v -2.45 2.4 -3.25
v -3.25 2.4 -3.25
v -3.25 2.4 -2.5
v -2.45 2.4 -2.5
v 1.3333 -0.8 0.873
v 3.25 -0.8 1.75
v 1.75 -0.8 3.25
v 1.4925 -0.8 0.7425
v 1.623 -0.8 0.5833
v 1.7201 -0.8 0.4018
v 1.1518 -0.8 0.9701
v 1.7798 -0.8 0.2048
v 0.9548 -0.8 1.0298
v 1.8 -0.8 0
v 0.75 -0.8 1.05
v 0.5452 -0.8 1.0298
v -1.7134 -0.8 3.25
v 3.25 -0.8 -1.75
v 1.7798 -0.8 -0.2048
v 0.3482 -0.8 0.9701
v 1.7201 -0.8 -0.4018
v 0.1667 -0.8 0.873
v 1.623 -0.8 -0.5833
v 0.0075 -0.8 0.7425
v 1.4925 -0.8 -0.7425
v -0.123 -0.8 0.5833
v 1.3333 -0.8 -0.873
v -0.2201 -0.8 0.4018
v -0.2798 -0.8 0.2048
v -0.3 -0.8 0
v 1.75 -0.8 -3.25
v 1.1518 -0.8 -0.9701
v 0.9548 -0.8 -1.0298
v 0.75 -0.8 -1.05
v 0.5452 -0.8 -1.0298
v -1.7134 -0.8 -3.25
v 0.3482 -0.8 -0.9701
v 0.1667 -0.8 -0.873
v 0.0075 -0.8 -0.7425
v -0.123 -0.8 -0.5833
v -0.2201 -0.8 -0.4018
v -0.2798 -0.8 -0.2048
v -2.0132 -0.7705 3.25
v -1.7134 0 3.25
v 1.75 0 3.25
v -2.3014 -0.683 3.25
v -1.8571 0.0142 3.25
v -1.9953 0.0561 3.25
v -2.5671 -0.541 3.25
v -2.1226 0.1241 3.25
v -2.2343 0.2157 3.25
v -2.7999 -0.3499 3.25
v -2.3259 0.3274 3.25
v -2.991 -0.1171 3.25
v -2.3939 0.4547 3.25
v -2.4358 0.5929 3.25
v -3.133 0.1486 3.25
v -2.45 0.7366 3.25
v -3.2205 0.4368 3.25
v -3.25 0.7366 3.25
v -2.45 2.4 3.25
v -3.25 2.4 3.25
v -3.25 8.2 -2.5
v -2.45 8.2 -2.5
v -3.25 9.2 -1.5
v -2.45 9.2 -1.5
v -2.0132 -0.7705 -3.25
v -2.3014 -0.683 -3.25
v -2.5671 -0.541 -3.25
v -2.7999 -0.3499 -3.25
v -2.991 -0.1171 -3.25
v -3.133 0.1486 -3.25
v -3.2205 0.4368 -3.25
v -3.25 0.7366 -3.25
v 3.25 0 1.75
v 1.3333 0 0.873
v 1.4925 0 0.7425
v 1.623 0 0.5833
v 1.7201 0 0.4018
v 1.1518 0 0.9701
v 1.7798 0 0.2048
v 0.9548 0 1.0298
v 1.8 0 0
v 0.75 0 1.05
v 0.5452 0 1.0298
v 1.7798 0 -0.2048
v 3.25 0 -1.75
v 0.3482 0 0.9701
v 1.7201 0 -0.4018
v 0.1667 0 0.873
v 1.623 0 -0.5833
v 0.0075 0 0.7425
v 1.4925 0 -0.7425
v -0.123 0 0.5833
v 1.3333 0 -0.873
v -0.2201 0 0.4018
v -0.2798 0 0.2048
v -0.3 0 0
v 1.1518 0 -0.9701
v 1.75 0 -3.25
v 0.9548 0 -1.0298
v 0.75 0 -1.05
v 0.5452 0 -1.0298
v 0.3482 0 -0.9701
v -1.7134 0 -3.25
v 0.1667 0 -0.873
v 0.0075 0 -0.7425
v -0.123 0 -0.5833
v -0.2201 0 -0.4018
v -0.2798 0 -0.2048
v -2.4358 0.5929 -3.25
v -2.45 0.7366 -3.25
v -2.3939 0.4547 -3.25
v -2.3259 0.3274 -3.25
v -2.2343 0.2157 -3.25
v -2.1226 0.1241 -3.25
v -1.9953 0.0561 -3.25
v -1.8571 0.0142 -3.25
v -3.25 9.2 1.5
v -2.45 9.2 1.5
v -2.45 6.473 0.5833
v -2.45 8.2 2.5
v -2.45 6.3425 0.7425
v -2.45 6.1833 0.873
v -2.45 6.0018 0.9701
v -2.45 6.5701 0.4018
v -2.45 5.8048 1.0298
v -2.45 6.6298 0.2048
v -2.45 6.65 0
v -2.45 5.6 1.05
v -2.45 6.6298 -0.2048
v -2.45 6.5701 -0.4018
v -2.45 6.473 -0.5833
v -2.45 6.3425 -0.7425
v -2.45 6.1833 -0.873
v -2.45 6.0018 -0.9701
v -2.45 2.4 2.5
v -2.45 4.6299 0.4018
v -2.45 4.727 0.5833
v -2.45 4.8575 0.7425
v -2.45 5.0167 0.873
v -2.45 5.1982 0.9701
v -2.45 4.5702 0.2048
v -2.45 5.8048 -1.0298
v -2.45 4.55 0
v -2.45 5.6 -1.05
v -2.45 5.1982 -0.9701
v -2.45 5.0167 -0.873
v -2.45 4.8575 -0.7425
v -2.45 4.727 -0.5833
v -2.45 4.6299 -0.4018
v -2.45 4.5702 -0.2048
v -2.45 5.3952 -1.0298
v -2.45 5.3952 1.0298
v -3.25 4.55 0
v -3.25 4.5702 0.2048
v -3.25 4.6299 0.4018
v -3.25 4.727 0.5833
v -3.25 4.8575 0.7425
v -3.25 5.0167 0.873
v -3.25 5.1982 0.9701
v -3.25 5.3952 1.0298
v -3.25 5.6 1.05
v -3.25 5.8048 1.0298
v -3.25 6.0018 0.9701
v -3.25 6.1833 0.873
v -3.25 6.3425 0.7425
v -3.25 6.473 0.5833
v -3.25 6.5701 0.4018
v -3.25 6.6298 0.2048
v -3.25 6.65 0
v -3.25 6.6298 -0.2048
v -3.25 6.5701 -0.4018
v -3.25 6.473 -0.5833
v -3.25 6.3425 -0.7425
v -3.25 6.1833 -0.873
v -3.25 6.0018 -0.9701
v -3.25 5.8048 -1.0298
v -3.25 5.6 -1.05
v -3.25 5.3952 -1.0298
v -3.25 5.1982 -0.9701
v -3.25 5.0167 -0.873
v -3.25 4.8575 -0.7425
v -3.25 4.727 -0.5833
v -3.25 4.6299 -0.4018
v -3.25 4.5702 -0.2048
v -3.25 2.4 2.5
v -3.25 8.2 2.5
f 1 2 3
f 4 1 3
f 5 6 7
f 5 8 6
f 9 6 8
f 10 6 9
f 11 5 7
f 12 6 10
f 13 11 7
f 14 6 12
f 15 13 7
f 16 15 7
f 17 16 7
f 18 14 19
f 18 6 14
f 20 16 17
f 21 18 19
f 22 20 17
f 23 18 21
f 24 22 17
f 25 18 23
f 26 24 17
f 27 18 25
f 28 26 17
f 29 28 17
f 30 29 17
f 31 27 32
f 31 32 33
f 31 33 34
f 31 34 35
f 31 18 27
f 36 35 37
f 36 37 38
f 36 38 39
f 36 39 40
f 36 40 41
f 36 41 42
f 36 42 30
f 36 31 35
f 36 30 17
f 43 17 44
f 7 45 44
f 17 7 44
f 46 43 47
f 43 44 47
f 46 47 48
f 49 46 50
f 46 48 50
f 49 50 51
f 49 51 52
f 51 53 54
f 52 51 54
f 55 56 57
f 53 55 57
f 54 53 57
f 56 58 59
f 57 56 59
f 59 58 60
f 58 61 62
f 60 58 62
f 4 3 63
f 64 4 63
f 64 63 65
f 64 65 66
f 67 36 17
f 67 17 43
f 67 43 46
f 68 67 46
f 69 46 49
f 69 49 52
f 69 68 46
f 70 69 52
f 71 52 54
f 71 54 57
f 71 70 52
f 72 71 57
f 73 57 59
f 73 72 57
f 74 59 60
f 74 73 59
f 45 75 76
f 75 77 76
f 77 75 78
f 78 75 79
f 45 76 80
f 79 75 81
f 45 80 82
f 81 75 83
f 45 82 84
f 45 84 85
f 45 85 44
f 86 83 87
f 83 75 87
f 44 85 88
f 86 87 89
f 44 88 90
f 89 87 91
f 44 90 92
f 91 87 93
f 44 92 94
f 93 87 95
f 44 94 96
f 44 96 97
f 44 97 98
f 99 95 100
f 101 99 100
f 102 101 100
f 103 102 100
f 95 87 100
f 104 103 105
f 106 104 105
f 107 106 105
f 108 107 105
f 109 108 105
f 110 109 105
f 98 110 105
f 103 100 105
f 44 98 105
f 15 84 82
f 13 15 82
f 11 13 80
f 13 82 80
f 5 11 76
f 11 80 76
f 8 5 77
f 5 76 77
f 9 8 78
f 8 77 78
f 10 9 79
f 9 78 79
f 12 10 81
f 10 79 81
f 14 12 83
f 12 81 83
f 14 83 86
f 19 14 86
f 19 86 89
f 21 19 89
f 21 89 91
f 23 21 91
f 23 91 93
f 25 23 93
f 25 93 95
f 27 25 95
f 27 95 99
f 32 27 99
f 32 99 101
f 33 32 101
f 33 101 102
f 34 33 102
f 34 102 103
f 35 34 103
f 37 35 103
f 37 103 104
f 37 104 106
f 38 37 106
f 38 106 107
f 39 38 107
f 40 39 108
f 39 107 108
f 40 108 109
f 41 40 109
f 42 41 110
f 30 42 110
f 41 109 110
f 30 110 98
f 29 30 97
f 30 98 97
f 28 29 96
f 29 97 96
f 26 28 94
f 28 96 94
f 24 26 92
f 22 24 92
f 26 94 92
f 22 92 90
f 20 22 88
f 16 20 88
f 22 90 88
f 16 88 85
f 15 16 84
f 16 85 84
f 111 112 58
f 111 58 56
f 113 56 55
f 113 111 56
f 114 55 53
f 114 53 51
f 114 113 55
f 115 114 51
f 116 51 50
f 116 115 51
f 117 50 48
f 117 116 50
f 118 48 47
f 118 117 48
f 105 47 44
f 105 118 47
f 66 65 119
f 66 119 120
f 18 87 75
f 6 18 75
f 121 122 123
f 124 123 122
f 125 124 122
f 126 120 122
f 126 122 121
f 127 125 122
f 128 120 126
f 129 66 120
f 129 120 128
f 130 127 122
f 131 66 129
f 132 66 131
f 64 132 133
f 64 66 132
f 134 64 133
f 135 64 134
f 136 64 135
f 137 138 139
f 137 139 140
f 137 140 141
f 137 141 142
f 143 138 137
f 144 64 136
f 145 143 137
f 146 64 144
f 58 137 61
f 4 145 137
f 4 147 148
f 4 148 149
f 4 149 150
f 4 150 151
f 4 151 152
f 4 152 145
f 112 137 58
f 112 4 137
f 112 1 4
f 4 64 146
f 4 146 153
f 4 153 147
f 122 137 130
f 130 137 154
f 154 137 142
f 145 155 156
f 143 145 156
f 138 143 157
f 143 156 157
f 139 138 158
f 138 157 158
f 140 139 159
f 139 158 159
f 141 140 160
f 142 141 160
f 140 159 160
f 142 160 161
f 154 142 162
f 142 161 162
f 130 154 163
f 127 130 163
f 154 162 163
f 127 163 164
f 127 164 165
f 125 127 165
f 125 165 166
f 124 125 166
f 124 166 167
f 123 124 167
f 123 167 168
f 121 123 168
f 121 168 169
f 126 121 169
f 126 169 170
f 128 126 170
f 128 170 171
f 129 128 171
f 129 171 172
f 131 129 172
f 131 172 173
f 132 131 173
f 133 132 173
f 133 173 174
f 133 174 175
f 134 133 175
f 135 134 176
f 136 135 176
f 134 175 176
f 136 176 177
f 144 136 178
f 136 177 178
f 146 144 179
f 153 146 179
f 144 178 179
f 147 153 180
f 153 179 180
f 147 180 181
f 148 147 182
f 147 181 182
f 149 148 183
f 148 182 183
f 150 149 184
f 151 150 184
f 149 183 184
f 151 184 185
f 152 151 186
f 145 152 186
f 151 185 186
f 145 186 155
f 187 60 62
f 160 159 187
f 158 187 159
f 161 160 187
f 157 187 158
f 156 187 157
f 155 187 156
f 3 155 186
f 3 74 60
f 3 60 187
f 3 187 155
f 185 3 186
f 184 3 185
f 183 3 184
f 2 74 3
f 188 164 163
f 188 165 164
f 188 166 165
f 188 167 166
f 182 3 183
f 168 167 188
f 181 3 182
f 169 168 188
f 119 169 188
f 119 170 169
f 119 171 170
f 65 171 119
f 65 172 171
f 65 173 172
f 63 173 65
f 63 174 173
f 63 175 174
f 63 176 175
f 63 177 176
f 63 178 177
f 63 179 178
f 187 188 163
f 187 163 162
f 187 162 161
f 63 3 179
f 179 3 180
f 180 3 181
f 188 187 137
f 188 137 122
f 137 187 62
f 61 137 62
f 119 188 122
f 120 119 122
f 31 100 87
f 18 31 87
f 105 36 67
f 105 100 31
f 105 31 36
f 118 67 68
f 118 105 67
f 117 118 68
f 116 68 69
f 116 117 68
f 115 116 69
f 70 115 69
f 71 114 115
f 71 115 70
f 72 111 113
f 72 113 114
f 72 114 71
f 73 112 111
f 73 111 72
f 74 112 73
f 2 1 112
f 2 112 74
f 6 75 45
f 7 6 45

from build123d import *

# Parameters (mm, degrees)
BASE_FLANGE1_DEPTH           = 0.8
EDGE_FLANGE1_STRIP_W         = 4.6732
EDGE_FLANGE1_STRIP_H         = 0.8
EDGE_FLANGE1_STRIP_CUT_DEPTH = 6.5
EDGE_FLANGE1_DEPTH           = 6.5
SKETCH10_W                   = 0.75
SKETCH10_H                   = 6.8
SKETCH10_R                   = 1.05
CUT_EXTRUDE1_DEPTH           = 12.724013818
BREAK_CORNER1_START          = 7.566042559
BREAK_CORNER1_OUTLINE_W      = 4
BREAK_CORNER1_OUTLINE_H      = 4.566042559
BREAK_CORNER1_DEPTH          = 0.707106781
BREAK_CORNER1_START_2        = 4.030508653
BREAK_CORNER1_2_OUTLINE_W    = 4
BREAK_CORNER1_2_OUTLINE_H    = 1.433957441
BREAK_CORNER1_2_DEPTH        = 1.414213562
SKETCH11_R                   = 1.05
CUT_EXTRUDE2_DEPTH           = 11.2842112


# Read off the part's stored shape, not the designer's step: Break-Corner1
# Sheet-metal steps are written as plain solids
with BuildPart() as part:
    # Sketch1 → Base-Flange1 (new body)
    with BuildSketch(Plane(origin=(0, 0, 0), x_dir=(1, 0, 0), z_dir=(0, 1, 0))):
        Polygon((1.75, 3.25), (3.25, 1.75), (3.25, -1.75), (1.75, -3.25), (-3.25, -3.25), (-3.25, 3.25), align=None)
    extrude(amount=-BASE_FLANGE1_DEPTH)

    # Edge-Flange1 strip (across the edge) → Edge-Flange1 strip cut (cut)
    with BuildSketch(Plane(origin=(-3.25, 0, -3.25), x_dir=(1, 0, 0), z_dir=(0, 0, 1))):
        with Locations((-0.8, -0.4)):
            Rectangle(EDGE_FLANGE1_STRIP_W, EDGE_FLANGE1_STRIP_H)
    extrude(amount=EDGE_FLANGE1_STRIP_CUT_DEPTH, mode=Mode.SUBTRACT)

    # Edge-Flange1 section (across the edge) → Edge-Flange1 (add)
    with BuildSketch(Plane(origin=(-3.25, 0, -3.25), x_dir=(1, 0, 0), z_dir=(0, 0, 1))):
        with BuildLine():
            Line((0, 0.7366), (0, 9.2))
            Line((0, 9.2), (0.8, 9.2))
            Line((0.8, 9.2), (0.8, 0.7366))
            ThreePointArc((0.8, 0.7366), (1.015745145, 0.215745145), (1.5366, 0))
            Line((1.5366, 0), (1.5366, -0.8))
            ThreePointArc((1.5366, -0.8), (0.45005972, -0.34994028), (0, 0.7366))
        make_face()
    extrude(amount=EDGE_FLANGE1_DEPTH)

    # Sketch10 → Cut-Extrude1 (cut, through all)
    with BuildSketch(Plane.ZY.offset(3.25)):
        with Locations((-2.875, 5.8)):
            Rectangle(SKETCH10_W, SKETCH10_H)
        with Locations((2.875, 5.8)):
            Rectangle(SKETCH10_W, SKETCH10_H)
        with Locations(Location((0, 5.6, 0), (0, 0, 270))):
            Circle(SKETCH10_R)
    extrude(amount=-CUT_EXTRUDE1_DEPTH, mode=Mode.SUBTRACT)

    # Break-Corner1 outline → Break-Corner1 (cut)
    with BuildSketch(Plane(origin=(0, 0, 0), x_dir=(1, 0, 0), z_dir=(0, 0.707106781186547, -0.707106781186548)).offset(BREAK_CORNER1_START)):
        with Locations((-3, -5.283021279)):
            Rectangle(BREAK_CORNER1_OUTLINE_W, BREAK_CORNER1_OUTLINE_H)
    extrude(amount=BREAK_CORNER1_DEPTH, mode=Mode.SUBTRACT)

    # Break-Corner1 2 outline → Break-Corner1 2 (cut)
    with BuildSketch(Plane(origin=(0, 0, 0), x_dir=(1, 0, 0), z_dir=(0, 0.707106781186547, -0.707106781186548)).offset(BREAK_CORNER1_START_2)):
        with Locations((-3, -8.283021279)):
            Rectangle(BREAK_CORNER1_2_OUTLINE_W, BREAK_CORNER1_2_OUTLINE_H)
    extrude(amount=BREAK_CORNER1_2_DEPTH, mode=Mode.SUBTRACT)

    # Sketch11 → Cut-Extrude2 (cut, through all)
    with BuildSketch(Plane(origin=(0, 0, 0), x_dir=(1, 0, 0), z_dir=(0, 1, 0))):
        with Locations(Location((0.75, 0, 0), (0, 0, 270))):
            Circle(SKETCH11_R)
    extrude(amount=-CUT_EXTRUDE2_DEPTH, mode=Mode.SUBTRACT)


solid = part.part
